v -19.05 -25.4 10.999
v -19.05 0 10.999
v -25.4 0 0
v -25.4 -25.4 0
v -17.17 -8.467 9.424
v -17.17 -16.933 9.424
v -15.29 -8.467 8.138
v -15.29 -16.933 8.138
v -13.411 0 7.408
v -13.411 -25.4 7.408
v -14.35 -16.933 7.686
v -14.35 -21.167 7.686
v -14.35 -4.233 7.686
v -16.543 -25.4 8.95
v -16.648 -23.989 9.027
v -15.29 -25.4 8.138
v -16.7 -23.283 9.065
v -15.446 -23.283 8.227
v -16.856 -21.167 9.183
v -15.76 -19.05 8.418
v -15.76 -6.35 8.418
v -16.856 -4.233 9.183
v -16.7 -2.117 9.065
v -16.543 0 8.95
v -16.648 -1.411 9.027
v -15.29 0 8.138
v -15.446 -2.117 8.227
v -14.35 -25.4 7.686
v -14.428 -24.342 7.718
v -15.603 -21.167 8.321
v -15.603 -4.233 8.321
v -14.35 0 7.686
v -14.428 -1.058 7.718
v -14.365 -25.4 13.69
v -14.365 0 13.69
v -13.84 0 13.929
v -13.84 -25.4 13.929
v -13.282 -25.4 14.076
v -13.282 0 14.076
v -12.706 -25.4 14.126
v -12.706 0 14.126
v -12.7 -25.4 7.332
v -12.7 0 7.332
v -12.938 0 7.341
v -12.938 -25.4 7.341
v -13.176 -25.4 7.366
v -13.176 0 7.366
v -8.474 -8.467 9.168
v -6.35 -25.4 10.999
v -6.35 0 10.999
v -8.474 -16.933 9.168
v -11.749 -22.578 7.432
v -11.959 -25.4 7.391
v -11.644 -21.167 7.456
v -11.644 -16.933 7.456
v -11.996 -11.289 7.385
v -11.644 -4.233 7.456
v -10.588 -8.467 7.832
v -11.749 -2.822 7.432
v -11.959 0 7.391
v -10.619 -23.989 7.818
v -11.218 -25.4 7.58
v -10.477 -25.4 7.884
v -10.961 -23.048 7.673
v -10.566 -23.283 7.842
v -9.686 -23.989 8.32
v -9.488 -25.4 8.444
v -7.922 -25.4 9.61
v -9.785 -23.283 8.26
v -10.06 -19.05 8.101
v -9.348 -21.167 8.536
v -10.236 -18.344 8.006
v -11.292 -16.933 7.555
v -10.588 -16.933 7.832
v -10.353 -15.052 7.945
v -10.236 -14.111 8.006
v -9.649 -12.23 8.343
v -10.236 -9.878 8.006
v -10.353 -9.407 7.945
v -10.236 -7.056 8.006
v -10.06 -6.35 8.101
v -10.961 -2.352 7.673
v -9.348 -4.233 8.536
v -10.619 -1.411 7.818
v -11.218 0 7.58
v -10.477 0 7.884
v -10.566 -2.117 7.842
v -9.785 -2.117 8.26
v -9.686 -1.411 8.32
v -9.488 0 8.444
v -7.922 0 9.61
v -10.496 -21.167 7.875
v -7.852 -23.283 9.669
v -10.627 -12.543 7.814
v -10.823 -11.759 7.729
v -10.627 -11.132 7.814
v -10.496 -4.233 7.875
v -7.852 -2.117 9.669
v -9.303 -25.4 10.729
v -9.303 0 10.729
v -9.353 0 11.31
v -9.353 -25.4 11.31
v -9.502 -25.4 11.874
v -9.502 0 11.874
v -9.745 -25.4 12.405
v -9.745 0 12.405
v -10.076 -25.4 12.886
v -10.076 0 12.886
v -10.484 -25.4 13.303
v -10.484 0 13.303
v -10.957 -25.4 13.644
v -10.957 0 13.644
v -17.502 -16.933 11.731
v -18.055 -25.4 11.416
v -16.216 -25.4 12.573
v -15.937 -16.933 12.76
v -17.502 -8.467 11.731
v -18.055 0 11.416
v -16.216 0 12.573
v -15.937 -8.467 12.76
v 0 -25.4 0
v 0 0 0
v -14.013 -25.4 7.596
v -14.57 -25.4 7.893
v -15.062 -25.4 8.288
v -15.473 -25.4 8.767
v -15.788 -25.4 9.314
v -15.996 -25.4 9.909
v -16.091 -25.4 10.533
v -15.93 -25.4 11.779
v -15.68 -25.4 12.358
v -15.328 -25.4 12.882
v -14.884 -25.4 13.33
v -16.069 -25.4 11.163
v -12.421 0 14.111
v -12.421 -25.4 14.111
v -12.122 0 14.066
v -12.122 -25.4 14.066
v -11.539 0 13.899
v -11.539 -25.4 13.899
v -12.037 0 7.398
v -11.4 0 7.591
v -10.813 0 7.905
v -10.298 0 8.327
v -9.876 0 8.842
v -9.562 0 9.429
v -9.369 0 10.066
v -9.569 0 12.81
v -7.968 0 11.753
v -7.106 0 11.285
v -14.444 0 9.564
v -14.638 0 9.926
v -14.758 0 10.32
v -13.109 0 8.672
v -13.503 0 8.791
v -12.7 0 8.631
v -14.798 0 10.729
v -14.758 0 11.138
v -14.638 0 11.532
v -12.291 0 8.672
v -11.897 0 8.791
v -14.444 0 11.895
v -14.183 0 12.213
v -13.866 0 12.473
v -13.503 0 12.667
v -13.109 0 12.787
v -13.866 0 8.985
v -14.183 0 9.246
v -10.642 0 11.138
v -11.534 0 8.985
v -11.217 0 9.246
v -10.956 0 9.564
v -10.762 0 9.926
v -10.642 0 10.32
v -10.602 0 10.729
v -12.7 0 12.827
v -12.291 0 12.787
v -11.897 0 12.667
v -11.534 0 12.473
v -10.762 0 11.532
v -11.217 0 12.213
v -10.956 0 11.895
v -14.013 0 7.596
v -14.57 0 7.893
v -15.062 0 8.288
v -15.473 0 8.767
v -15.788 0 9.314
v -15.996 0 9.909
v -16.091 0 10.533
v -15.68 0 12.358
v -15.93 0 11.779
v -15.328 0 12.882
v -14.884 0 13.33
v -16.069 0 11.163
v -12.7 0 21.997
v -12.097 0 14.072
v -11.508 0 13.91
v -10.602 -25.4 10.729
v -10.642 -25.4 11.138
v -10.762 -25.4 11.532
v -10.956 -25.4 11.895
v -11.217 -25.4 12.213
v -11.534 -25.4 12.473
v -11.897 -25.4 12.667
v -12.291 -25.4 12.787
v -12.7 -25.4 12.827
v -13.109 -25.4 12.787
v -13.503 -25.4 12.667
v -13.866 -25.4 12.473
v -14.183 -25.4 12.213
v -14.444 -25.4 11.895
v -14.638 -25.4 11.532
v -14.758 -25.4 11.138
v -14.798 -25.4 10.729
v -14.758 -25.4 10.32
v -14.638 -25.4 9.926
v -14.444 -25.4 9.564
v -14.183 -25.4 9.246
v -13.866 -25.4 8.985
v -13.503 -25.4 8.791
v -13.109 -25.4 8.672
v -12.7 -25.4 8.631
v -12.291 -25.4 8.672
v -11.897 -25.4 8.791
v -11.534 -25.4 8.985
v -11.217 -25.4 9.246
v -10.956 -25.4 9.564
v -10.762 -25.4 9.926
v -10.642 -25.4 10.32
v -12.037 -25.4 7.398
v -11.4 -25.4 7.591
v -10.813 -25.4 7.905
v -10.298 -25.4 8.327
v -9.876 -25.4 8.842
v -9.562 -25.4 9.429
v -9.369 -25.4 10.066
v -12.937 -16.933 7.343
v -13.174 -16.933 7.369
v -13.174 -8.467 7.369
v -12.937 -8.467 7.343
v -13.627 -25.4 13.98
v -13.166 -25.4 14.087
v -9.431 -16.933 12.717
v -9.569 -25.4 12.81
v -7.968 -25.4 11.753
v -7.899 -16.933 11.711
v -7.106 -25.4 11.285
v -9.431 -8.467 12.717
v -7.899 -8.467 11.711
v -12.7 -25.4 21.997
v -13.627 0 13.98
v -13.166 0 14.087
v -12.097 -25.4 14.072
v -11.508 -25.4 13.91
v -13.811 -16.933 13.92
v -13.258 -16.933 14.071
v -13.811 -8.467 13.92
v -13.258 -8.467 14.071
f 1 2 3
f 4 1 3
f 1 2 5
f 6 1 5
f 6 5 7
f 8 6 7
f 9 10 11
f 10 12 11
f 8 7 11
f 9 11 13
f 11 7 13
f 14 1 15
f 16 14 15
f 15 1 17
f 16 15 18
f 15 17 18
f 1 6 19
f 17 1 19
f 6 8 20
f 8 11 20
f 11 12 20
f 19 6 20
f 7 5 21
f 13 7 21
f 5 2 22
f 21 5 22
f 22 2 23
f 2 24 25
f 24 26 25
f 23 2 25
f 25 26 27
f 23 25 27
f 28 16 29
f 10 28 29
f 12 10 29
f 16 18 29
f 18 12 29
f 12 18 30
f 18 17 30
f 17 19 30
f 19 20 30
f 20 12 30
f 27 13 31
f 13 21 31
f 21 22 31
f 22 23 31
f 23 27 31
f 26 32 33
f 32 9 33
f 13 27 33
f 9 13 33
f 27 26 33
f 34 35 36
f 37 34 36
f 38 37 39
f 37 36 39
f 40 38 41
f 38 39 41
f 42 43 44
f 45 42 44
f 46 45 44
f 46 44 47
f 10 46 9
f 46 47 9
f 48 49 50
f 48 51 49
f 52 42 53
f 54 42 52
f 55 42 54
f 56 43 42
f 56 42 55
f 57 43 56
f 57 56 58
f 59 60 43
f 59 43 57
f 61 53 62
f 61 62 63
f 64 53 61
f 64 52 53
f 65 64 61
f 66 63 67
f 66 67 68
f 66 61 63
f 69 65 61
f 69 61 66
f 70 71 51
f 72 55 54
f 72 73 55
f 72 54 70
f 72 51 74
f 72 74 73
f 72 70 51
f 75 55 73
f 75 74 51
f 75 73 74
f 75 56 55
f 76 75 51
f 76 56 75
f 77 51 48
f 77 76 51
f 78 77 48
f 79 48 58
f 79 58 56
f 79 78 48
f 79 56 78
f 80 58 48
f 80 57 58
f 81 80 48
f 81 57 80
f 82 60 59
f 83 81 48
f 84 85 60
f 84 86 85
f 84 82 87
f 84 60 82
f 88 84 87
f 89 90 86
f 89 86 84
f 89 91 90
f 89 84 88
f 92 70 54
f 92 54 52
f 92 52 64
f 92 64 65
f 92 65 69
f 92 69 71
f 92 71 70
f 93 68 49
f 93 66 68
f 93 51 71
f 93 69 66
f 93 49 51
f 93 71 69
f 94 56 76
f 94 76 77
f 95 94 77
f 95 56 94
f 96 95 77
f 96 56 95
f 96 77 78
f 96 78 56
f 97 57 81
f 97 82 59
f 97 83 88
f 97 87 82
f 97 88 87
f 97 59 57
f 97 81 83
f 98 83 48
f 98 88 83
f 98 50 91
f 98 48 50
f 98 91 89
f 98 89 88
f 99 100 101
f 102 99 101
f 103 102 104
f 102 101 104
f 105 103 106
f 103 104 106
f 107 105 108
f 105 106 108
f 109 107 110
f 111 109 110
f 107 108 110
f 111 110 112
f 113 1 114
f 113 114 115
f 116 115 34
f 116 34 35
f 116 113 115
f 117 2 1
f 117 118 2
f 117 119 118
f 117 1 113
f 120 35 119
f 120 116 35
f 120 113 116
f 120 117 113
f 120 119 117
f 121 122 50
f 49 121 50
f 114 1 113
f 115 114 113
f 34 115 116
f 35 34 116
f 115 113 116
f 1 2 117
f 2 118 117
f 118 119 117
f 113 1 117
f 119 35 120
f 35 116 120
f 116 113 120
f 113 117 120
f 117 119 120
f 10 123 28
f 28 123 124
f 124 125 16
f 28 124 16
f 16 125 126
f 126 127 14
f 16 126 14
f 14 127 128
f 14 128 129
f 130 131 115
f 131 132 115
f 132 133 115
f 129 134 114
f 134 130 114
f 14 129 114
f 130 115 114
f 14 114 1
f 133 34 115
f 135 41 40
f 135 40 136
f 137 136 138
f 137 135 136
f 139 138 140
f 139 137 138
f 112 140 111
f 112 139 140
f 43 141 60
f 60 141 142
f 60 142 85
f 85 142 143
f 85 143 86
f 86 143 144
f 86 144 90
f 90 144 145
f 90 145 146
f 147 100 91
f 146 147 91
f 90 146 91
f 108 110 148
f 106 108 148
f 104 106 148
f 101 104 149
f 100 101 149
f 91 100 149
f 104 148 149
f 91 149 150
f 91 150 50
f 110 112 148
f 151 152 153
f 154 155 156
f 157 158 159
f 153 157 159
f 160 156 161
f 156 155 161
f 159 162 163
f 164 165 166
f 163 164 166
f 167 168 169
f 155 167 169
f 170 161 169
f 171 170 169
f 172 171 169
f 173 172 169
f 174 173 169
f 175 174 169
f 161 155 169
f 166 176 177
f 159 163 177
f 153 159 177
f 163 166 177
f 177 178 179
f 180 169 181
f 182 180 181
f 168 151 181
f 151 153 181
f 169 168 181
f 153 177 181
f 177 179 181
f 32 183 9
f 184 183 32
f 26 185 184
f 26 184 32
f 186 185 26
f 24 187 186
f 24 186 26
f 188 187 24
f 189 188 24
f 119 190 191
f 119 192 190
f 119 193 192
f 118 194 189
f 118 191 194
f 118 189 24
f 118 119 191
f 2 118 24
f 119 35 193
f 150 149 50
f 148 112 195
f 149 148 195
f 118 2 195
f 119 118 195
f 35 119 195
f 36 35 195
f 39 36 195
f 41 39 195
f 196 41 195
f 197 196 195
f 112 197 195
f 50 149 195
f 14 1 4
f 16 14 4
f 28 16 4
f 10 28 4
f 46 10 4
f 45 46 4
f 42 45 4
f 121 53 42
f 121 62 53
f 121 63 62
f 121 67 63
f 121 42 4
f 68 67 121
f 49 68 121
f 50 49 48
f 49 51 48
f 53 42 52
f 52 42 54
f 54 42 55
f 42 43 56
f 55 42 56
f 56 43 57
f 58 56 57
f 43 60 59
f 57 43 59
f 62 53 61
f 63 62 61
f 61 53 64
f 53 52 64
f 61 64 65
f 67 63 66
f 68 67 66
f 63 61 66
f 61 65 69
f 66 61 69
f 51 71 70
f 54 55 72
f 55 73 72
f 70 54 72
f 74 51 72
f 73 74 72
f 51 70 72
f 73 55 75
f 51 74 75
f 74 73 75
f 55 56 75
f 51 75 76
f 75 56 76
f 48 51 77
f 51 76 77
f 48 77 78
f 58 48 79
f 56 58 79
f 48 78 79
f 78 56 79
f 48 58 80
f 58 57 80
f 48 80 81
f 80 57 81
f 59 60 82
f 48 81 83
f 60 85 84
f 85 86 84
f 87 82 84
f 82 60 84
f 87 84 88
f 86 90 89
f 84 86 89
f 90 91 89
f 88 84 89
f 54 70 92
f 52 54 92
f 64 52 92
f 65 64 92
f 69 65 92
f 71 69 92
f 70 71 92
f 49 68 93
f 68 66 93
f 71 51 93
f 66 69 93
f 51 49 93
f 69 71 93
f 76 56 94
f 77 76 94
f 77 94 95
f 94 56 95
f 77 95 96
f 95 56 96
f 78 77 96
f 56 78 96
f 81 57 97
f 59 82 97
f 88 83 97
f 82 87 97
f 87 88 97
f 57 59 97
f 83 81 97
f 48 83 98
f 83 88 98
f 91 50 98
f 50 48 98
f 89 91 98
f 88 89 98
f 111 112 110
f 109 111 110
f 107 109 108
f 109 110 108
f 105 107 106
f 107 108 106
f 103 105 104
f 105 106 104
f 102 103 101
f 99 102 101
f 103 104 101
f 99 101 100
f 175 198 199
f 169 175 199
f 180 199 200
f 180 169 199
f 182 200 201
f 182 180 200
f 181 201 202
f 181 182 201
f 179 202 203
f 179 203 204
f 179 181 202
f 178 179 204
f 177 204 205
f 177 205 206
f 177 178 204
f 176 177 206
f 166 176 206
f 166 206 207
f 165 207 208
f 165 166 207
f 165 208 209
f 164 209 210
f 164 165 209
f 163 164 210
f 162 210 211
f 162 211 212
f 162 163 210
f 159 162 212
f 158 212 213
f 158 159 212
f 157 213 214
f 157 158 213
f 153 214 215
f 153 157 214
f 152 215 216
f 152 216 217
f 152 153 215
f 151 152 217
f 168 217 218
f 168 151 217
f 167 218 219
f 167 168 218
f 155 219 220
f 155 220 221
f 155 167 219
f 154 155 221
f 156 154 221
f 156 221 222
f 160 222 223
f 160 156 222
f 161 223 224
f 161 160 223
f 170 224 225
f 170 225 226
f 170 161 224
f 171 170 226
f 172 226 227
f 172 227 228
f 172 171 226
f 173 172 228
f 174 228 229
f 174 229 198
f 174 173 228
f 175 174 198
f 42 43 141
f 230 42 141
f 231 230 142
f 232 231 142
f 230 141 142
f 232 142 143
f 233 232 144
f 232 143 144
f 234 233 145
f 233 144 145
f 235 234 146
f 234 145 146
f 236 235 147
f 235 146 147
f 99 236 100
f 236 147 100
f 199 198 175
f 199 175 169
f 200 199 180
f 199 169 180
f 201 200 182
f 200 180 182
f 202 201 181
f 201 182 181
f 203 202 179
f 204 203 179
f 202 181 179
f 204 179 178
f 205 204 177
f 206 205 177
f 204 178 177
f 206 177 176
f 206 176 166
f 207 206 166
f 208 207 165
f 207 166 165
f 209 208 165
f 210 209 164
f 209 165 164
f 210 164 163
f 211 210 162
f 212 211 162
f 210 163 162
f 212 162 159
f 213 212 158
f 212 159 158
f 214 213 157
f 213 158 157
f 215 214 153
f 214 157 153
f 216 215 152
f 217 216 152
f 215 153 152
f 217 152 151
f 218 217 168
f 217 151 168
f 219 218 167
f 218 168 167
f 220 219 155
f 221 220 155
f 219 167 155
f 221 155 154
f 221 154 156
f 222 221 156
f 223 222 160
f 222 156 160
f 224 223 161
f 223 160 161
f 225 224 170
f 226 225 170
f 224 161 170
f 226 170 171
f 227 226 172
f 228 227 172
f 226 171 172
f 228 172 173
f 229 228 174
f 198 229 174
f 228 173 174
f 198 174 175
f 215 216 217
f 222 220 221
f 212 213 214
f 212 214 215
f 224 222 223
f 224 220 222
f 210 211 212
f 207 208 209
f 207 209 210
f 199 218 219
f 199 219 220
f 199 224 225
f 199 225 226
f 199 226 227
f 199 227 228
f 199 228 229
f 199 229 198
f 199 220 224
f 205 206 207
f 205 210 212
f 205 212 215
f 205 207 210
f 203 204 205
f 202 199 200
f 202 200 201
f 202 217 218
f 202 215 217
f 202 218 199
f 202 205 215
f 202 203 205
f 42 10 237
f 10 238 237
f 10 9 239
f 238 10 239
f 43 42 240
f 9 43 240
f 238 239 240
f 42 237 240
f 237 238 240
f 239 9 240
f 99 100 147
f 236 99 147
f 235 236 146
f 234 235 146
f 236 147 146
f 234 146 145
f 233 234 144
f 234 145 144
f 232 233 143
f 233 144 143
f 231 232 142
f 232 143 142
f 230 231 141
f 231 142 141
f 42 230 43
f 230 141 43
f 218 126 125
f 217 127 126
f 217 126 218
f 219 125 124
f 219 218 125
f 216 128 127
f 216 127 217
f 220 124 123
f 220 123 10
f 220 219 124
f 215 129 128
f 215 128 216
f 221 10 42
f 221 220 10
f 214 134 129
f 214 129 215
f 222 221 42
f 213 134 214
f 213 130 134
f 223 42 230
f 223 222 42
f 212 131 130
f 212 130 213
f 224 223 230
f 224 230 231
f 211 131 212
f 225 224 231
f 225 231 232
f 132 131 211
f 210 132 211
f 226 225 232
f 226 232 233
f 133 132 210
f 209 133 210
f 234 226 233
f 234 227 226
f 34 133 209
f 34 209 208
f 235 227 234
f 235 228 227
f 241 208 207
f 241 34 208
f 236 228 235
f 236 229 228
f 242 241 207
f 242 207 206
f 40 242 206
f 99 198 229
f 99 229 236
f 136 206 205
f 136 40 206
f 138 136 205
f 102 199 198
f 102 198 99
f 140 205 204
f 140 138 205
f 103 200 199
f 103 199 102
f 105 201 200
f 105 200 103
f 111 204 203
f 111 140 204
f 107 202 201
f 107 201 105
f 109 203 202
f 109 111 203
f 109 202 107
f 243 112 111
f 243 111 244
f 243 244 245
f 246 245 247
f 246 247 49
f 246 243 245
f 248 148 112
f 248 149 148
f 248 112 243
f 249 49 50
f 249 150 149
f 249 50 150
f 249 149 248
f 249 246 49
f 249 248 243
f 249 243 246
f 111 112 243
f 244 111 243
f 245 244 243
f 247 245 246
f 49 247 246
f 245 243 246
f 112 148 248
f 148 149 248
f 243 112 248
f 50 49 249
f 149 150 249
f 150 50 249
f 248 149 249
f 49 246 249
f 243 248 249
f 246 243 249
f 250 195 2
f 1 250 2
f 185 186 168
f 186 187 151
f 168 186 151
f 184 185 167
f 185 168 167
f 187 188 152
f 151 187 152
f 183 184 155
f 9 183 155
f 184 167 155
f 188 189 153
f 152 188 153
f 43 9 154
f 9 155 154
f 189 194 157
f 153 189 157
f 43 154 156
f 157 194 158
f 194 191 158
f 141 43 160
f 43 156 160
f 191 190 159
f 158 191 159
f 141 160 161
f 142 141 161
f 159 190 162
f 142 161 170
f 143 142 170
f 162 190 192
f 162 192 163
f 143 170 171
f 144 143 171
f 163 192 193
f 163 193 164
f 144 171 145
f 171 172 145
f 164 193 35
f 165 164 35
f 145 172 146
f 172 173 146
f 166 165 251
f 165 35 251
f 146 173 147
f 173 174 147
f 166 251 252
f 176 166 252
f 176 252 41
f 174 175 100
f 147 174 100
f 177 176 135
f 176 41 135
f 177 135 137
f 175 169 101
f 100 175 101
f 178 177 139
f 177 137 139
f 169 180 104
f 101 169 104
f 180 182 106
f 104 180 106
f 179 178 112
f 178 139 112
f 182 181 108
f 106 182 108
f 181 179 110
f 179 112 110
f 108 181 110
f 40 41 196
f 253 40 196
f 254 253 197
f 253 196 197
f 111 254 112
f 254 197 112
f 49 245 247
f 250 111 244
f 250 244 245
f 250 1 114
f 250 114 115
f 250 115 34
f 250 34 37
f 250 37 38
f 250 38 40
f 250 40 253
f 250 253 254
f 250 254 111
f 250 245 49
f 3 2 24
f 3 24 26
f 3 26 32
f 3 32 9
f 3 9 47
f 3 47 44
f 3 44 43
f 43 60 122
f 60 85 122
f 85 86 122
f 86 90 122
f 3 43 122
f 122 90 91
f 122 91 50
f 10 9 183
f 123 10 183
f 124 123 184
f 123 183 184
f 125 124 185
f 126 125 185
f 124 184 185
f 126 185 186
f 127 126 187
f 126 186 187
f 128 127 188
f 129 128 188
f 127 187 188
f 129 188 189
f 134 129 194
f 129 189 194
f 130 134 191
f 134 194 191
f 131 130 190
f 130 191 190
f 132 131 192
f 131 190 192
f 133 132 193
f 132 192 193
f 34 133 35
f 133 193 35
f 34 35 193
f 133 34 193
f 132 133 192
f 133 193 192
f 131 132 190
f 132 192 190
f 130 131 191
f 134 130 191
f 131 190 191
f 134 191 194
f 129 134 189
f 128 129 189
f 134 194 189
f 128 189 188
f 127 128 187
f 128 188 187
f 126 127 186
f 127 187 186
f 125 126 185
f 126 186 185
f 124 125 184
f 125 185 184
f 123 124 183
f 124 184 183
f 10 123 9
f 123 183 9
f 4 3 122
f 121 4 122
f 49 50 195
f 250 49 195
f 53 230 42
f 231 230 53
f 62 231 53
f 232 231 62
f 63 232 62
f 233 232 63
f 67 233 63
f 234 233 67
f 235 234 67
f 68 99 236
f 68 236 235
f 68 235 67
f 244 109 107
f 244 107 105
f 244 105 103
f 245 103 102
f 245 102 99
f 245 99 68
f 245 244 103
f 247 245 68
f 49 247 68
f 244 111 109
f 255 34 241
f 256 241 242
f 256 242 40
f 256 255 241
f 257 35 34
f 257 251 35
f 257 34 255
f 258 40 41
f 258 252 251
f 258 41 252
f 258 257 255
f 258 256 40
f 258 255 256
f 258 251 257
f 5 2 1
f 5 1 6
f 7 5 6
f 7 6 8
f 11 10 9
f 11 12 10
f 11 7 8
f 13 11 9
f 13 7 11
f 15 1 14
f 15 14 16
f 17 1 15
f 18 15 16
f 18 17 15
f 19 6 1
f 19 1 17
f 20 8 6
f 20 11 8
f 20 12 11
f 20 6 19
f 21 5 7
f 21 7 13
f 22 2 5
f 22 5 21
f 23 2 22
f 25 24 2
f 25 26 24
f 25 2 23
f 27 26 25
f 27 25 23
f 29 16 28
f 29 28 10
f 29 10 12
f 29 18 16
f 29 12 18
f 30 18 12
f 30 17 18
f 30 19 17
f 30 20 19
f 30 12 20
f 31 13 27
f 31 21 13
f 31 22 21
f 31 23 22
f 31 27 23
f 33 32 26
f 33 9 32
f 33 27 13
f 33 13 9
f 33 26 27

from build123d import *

# Parameters (mm, degrees)
F1_DEPTH = 25.4
F2_DEPTH = 25.4
F0_R     = 2.0978852378
F3_DEPTH = 25.4
F4_DEPTH = 25.4


with BuildPart() as f1:
    # F0 (on Front) → F1 (new body)
    with BuildSketch(Plane.XZ):
        with BuildLine():
            add(Edge.make_bspline(
                [(-12.7, 7.3323484187), (-10.5868676769, 7.2995452687), (-8.480804041, 9.0342229232), (-6.35, 10.9985226281)],
                knots=[0.5, 0.5, 0.5, 0.5, 1, 1, 1, 1], degree=3))
            add(Edge.make_bspline(
                [(-10.9566757348, 13.6443291005), (-9.4315203102, 12.8820206207), (-7.9096867806, 11.4385141645), (-6.35, 10.9985226281)],
                knots=[0.6377352874, 0.6377352874, 0.6377352874, 0.6377352874, 1, 1, 1, 1], degree=3))
            ThreePointArc((-10.9566757348, 13.6443291005), (-9.7453901873, 12.4048256996), (-9.3032627647, 10.729085654))
            ThreePointArc((-9.3032627647, 10.729085654), (-10.298144067, 8.327229721), (-12.7, 7.3323484187))
        make_face()
    extrude(amount=F1_DEPTH)


with BuildPart() as f1b:
    # F0 (on Front) → F1, piece 2 (new body)
    with BuildSketch(Plane.XZ):
        with BuildLine():
            add(Edge.make_bspline(
                [(-19.05, 10.9985226281), (-17.5134159045, 11.4502441937), (-15.937284411, 12.9413228119), (-14.3653817243, 13.6895463543)],
                knots=[0, 0, 0, 0, 0.3693022198, 0.3693022198, 0.3693022198, 0.3693022198], degree=3))
            add(Edge.make_bspline(
                [(-19.05, 10.9985226281), (-17.1705555831, 9.3708760181), (-15.2883246422, 7.7690918532), (-13.4107298629, 7.4075367822)],
                knots=[0, 0, 0, 0, 0.4439632481, 0.4439632481, 0.4439632481, 0.4439632481], degree=3))
            ThreePointArc((-13.4107298629, 7.4075367822), (-16.058182192, 10.2187561418), (-14.3653817243, 13.6895463543))
        make_face()
    extrude(amount=F1_DEPTH)


with BuildPart() as f2:
    # F0 (on Front) → F2 (new body)
    with BuildSketch(Plane.XZ):
        with BuildLine():
            Line((-25.4, 0), (0, 0))
            Line((0, 0), (-6.35, 10.9985226281))
            add(Edge.make_bspline(
                [(-12.7, 7.3323484187), (-10.5868676769, 7.2995452687), (-8.480804041, 9.0342229232), (-6.35, 10.9985226281)],
                knots=[0.5, 0.5, 0.5, 0.5, 1, 1, 1, 1], degree=3))
            ThreePointArc((-12.7, 7.3323484187), (-13.0573479495, 7.3511978097), (-13.4107298629, 7.4075367822))
            add(Edge.make_bspline(
                [(-19.05, 10.9985226281), (-17.1705555831, 9.3708760181), (-15.2883246422, 7.7690918532), (-13.4107298629, 7.4075367822)],
                knots=[0, 0, 0, 0, 0.4439632481, 0.4439632481, 0.4439632481, 0.4439632481], degree=3))
            Line((-19.05, 10.9985226281), (-25.4, 0))
        make_face()
    extrude(amount=F2_DEPTH)


with BuildPart() as f2b:
    # F0 (on Front) → F2, piece 2 (new body)
    with BuildSketch(Plane.XZ):
        with BuildLine():
            add(Edge.make_bspline(
                [(-10.9566757348, 13.6443291005), (-9.4315203102, 12.8820206207), (-7.9096867806, 11.4385141645), (-6.35, 10.9985226281)],
                knots=[0.6377352874, 0.6377352874, 0.6377352874, 0.6377352874, 1, 1, 1, 1], degree=3))
            Line((-6.35, 10.9985226281), (-12.7, 21.9970452561))
            Line((-12.7, 21.9970452561), (-19.05, 10.9985226281))
            add(Edge.make_bspline(
                [(-19.05, 10.9985226281), (-17.5134159045, 11.4502441937), (-15.937284411, 12.9413228119), (-14.3653817243, 13.6895463543)],
                knots=[0, 0, 0, 0, 0.3693022198, 0.3693022198, 0.3693022198, 0.3693022198], degree=3))
            ThreePointArc((-14.3653817243, 13.6895463543), (-13.563874614, 14.0141342833), (-12.706379445, 14.1258168987))
            ThreePointArc((-12.706379445, 14.1258168987), (-11.7987775235, 14.0040851798), (-10.9566757348, 13.6443291005))
        make_face()
    extrude(amount=F2_DEPTH)


with BuildPart() as f3:
    # F0 (on Front) → F3 (new body)
    with BuildSketch(Plane.XZ):
        with BuildLine():
            ThreePointArc((-9.3032627647, 10.729085654), (-9.7453901873, 12.4048256996), (-10.9566757348, 13.6443291005))
            add(Edge.make_bspline(
                [(-12.706379448, 14.1258185172), (-12.7042529289, 14.1258225126), (-12.1190194564, 14.1262240099), (-11.5365492734, 13.9341635059), (-10.9566757348, 13.6443291005)],
                knots=[0.499497705, 0.499497705, 0.499497705, 0.499497705, 0.5, 0.6377352874, 0.6377352874, 0.6377352874, 0.6377352874], degree=3))
            add(Edge.make_bspline(
                [(-14.3653817243, 13.6895463543), (-13.8112159973, 13.9533284872), (-13.2575758588, 14.1247829006), (-12.706379448, 14.1258185172)],
                knots=[0.3693022198, 0.3693022198, 0.3693022198, 0.3693022198, 0.499497705, 0.499497705, 0.499497705, 0.499497705], degree=3))
            ThreePointArc((-14.3653817243, 13.6895463543), (-16.058182192, 10.2187561418), (-13.4107298629, 7.4075367822))
            add(Edge.make_bspline(
                [(-13.4107298629, 7.4075367822), (-13.1737410731, 7.3619015367), (-12.9368261435, 7.3360247827), (-12.7, 7.3323484187)],
                knots=[0.4439632481, 0.4439632481, 0.4439632481, 0.4439632481, 0.5, 0.5, 0.5, 0.5], degree=3))
            ThreePointArc((-12.7, 7.3323484187), (-10.298144067, 8.327229721), (-9.3032627647, 10.729085654))
        make_face()
        with Locations((-12.7, 10.729085654)):
            Circle(F0_R, mode=Mode.SUBTRACT)
    extrude(amount=F3_DEPTH)


with BuildPart() as f4:
    # F0 (on Front) → F4 (new body)
    with BuildSketch(Plane.XZ):
        with Locations((-12.7, 10.729085654)):
            Circle(F0_R)
    extrude(amount=F4_DEPTH)


solid = Compound([f1.part, f1b.part, f2.part, f2b.part, f3.part, f4.part])
